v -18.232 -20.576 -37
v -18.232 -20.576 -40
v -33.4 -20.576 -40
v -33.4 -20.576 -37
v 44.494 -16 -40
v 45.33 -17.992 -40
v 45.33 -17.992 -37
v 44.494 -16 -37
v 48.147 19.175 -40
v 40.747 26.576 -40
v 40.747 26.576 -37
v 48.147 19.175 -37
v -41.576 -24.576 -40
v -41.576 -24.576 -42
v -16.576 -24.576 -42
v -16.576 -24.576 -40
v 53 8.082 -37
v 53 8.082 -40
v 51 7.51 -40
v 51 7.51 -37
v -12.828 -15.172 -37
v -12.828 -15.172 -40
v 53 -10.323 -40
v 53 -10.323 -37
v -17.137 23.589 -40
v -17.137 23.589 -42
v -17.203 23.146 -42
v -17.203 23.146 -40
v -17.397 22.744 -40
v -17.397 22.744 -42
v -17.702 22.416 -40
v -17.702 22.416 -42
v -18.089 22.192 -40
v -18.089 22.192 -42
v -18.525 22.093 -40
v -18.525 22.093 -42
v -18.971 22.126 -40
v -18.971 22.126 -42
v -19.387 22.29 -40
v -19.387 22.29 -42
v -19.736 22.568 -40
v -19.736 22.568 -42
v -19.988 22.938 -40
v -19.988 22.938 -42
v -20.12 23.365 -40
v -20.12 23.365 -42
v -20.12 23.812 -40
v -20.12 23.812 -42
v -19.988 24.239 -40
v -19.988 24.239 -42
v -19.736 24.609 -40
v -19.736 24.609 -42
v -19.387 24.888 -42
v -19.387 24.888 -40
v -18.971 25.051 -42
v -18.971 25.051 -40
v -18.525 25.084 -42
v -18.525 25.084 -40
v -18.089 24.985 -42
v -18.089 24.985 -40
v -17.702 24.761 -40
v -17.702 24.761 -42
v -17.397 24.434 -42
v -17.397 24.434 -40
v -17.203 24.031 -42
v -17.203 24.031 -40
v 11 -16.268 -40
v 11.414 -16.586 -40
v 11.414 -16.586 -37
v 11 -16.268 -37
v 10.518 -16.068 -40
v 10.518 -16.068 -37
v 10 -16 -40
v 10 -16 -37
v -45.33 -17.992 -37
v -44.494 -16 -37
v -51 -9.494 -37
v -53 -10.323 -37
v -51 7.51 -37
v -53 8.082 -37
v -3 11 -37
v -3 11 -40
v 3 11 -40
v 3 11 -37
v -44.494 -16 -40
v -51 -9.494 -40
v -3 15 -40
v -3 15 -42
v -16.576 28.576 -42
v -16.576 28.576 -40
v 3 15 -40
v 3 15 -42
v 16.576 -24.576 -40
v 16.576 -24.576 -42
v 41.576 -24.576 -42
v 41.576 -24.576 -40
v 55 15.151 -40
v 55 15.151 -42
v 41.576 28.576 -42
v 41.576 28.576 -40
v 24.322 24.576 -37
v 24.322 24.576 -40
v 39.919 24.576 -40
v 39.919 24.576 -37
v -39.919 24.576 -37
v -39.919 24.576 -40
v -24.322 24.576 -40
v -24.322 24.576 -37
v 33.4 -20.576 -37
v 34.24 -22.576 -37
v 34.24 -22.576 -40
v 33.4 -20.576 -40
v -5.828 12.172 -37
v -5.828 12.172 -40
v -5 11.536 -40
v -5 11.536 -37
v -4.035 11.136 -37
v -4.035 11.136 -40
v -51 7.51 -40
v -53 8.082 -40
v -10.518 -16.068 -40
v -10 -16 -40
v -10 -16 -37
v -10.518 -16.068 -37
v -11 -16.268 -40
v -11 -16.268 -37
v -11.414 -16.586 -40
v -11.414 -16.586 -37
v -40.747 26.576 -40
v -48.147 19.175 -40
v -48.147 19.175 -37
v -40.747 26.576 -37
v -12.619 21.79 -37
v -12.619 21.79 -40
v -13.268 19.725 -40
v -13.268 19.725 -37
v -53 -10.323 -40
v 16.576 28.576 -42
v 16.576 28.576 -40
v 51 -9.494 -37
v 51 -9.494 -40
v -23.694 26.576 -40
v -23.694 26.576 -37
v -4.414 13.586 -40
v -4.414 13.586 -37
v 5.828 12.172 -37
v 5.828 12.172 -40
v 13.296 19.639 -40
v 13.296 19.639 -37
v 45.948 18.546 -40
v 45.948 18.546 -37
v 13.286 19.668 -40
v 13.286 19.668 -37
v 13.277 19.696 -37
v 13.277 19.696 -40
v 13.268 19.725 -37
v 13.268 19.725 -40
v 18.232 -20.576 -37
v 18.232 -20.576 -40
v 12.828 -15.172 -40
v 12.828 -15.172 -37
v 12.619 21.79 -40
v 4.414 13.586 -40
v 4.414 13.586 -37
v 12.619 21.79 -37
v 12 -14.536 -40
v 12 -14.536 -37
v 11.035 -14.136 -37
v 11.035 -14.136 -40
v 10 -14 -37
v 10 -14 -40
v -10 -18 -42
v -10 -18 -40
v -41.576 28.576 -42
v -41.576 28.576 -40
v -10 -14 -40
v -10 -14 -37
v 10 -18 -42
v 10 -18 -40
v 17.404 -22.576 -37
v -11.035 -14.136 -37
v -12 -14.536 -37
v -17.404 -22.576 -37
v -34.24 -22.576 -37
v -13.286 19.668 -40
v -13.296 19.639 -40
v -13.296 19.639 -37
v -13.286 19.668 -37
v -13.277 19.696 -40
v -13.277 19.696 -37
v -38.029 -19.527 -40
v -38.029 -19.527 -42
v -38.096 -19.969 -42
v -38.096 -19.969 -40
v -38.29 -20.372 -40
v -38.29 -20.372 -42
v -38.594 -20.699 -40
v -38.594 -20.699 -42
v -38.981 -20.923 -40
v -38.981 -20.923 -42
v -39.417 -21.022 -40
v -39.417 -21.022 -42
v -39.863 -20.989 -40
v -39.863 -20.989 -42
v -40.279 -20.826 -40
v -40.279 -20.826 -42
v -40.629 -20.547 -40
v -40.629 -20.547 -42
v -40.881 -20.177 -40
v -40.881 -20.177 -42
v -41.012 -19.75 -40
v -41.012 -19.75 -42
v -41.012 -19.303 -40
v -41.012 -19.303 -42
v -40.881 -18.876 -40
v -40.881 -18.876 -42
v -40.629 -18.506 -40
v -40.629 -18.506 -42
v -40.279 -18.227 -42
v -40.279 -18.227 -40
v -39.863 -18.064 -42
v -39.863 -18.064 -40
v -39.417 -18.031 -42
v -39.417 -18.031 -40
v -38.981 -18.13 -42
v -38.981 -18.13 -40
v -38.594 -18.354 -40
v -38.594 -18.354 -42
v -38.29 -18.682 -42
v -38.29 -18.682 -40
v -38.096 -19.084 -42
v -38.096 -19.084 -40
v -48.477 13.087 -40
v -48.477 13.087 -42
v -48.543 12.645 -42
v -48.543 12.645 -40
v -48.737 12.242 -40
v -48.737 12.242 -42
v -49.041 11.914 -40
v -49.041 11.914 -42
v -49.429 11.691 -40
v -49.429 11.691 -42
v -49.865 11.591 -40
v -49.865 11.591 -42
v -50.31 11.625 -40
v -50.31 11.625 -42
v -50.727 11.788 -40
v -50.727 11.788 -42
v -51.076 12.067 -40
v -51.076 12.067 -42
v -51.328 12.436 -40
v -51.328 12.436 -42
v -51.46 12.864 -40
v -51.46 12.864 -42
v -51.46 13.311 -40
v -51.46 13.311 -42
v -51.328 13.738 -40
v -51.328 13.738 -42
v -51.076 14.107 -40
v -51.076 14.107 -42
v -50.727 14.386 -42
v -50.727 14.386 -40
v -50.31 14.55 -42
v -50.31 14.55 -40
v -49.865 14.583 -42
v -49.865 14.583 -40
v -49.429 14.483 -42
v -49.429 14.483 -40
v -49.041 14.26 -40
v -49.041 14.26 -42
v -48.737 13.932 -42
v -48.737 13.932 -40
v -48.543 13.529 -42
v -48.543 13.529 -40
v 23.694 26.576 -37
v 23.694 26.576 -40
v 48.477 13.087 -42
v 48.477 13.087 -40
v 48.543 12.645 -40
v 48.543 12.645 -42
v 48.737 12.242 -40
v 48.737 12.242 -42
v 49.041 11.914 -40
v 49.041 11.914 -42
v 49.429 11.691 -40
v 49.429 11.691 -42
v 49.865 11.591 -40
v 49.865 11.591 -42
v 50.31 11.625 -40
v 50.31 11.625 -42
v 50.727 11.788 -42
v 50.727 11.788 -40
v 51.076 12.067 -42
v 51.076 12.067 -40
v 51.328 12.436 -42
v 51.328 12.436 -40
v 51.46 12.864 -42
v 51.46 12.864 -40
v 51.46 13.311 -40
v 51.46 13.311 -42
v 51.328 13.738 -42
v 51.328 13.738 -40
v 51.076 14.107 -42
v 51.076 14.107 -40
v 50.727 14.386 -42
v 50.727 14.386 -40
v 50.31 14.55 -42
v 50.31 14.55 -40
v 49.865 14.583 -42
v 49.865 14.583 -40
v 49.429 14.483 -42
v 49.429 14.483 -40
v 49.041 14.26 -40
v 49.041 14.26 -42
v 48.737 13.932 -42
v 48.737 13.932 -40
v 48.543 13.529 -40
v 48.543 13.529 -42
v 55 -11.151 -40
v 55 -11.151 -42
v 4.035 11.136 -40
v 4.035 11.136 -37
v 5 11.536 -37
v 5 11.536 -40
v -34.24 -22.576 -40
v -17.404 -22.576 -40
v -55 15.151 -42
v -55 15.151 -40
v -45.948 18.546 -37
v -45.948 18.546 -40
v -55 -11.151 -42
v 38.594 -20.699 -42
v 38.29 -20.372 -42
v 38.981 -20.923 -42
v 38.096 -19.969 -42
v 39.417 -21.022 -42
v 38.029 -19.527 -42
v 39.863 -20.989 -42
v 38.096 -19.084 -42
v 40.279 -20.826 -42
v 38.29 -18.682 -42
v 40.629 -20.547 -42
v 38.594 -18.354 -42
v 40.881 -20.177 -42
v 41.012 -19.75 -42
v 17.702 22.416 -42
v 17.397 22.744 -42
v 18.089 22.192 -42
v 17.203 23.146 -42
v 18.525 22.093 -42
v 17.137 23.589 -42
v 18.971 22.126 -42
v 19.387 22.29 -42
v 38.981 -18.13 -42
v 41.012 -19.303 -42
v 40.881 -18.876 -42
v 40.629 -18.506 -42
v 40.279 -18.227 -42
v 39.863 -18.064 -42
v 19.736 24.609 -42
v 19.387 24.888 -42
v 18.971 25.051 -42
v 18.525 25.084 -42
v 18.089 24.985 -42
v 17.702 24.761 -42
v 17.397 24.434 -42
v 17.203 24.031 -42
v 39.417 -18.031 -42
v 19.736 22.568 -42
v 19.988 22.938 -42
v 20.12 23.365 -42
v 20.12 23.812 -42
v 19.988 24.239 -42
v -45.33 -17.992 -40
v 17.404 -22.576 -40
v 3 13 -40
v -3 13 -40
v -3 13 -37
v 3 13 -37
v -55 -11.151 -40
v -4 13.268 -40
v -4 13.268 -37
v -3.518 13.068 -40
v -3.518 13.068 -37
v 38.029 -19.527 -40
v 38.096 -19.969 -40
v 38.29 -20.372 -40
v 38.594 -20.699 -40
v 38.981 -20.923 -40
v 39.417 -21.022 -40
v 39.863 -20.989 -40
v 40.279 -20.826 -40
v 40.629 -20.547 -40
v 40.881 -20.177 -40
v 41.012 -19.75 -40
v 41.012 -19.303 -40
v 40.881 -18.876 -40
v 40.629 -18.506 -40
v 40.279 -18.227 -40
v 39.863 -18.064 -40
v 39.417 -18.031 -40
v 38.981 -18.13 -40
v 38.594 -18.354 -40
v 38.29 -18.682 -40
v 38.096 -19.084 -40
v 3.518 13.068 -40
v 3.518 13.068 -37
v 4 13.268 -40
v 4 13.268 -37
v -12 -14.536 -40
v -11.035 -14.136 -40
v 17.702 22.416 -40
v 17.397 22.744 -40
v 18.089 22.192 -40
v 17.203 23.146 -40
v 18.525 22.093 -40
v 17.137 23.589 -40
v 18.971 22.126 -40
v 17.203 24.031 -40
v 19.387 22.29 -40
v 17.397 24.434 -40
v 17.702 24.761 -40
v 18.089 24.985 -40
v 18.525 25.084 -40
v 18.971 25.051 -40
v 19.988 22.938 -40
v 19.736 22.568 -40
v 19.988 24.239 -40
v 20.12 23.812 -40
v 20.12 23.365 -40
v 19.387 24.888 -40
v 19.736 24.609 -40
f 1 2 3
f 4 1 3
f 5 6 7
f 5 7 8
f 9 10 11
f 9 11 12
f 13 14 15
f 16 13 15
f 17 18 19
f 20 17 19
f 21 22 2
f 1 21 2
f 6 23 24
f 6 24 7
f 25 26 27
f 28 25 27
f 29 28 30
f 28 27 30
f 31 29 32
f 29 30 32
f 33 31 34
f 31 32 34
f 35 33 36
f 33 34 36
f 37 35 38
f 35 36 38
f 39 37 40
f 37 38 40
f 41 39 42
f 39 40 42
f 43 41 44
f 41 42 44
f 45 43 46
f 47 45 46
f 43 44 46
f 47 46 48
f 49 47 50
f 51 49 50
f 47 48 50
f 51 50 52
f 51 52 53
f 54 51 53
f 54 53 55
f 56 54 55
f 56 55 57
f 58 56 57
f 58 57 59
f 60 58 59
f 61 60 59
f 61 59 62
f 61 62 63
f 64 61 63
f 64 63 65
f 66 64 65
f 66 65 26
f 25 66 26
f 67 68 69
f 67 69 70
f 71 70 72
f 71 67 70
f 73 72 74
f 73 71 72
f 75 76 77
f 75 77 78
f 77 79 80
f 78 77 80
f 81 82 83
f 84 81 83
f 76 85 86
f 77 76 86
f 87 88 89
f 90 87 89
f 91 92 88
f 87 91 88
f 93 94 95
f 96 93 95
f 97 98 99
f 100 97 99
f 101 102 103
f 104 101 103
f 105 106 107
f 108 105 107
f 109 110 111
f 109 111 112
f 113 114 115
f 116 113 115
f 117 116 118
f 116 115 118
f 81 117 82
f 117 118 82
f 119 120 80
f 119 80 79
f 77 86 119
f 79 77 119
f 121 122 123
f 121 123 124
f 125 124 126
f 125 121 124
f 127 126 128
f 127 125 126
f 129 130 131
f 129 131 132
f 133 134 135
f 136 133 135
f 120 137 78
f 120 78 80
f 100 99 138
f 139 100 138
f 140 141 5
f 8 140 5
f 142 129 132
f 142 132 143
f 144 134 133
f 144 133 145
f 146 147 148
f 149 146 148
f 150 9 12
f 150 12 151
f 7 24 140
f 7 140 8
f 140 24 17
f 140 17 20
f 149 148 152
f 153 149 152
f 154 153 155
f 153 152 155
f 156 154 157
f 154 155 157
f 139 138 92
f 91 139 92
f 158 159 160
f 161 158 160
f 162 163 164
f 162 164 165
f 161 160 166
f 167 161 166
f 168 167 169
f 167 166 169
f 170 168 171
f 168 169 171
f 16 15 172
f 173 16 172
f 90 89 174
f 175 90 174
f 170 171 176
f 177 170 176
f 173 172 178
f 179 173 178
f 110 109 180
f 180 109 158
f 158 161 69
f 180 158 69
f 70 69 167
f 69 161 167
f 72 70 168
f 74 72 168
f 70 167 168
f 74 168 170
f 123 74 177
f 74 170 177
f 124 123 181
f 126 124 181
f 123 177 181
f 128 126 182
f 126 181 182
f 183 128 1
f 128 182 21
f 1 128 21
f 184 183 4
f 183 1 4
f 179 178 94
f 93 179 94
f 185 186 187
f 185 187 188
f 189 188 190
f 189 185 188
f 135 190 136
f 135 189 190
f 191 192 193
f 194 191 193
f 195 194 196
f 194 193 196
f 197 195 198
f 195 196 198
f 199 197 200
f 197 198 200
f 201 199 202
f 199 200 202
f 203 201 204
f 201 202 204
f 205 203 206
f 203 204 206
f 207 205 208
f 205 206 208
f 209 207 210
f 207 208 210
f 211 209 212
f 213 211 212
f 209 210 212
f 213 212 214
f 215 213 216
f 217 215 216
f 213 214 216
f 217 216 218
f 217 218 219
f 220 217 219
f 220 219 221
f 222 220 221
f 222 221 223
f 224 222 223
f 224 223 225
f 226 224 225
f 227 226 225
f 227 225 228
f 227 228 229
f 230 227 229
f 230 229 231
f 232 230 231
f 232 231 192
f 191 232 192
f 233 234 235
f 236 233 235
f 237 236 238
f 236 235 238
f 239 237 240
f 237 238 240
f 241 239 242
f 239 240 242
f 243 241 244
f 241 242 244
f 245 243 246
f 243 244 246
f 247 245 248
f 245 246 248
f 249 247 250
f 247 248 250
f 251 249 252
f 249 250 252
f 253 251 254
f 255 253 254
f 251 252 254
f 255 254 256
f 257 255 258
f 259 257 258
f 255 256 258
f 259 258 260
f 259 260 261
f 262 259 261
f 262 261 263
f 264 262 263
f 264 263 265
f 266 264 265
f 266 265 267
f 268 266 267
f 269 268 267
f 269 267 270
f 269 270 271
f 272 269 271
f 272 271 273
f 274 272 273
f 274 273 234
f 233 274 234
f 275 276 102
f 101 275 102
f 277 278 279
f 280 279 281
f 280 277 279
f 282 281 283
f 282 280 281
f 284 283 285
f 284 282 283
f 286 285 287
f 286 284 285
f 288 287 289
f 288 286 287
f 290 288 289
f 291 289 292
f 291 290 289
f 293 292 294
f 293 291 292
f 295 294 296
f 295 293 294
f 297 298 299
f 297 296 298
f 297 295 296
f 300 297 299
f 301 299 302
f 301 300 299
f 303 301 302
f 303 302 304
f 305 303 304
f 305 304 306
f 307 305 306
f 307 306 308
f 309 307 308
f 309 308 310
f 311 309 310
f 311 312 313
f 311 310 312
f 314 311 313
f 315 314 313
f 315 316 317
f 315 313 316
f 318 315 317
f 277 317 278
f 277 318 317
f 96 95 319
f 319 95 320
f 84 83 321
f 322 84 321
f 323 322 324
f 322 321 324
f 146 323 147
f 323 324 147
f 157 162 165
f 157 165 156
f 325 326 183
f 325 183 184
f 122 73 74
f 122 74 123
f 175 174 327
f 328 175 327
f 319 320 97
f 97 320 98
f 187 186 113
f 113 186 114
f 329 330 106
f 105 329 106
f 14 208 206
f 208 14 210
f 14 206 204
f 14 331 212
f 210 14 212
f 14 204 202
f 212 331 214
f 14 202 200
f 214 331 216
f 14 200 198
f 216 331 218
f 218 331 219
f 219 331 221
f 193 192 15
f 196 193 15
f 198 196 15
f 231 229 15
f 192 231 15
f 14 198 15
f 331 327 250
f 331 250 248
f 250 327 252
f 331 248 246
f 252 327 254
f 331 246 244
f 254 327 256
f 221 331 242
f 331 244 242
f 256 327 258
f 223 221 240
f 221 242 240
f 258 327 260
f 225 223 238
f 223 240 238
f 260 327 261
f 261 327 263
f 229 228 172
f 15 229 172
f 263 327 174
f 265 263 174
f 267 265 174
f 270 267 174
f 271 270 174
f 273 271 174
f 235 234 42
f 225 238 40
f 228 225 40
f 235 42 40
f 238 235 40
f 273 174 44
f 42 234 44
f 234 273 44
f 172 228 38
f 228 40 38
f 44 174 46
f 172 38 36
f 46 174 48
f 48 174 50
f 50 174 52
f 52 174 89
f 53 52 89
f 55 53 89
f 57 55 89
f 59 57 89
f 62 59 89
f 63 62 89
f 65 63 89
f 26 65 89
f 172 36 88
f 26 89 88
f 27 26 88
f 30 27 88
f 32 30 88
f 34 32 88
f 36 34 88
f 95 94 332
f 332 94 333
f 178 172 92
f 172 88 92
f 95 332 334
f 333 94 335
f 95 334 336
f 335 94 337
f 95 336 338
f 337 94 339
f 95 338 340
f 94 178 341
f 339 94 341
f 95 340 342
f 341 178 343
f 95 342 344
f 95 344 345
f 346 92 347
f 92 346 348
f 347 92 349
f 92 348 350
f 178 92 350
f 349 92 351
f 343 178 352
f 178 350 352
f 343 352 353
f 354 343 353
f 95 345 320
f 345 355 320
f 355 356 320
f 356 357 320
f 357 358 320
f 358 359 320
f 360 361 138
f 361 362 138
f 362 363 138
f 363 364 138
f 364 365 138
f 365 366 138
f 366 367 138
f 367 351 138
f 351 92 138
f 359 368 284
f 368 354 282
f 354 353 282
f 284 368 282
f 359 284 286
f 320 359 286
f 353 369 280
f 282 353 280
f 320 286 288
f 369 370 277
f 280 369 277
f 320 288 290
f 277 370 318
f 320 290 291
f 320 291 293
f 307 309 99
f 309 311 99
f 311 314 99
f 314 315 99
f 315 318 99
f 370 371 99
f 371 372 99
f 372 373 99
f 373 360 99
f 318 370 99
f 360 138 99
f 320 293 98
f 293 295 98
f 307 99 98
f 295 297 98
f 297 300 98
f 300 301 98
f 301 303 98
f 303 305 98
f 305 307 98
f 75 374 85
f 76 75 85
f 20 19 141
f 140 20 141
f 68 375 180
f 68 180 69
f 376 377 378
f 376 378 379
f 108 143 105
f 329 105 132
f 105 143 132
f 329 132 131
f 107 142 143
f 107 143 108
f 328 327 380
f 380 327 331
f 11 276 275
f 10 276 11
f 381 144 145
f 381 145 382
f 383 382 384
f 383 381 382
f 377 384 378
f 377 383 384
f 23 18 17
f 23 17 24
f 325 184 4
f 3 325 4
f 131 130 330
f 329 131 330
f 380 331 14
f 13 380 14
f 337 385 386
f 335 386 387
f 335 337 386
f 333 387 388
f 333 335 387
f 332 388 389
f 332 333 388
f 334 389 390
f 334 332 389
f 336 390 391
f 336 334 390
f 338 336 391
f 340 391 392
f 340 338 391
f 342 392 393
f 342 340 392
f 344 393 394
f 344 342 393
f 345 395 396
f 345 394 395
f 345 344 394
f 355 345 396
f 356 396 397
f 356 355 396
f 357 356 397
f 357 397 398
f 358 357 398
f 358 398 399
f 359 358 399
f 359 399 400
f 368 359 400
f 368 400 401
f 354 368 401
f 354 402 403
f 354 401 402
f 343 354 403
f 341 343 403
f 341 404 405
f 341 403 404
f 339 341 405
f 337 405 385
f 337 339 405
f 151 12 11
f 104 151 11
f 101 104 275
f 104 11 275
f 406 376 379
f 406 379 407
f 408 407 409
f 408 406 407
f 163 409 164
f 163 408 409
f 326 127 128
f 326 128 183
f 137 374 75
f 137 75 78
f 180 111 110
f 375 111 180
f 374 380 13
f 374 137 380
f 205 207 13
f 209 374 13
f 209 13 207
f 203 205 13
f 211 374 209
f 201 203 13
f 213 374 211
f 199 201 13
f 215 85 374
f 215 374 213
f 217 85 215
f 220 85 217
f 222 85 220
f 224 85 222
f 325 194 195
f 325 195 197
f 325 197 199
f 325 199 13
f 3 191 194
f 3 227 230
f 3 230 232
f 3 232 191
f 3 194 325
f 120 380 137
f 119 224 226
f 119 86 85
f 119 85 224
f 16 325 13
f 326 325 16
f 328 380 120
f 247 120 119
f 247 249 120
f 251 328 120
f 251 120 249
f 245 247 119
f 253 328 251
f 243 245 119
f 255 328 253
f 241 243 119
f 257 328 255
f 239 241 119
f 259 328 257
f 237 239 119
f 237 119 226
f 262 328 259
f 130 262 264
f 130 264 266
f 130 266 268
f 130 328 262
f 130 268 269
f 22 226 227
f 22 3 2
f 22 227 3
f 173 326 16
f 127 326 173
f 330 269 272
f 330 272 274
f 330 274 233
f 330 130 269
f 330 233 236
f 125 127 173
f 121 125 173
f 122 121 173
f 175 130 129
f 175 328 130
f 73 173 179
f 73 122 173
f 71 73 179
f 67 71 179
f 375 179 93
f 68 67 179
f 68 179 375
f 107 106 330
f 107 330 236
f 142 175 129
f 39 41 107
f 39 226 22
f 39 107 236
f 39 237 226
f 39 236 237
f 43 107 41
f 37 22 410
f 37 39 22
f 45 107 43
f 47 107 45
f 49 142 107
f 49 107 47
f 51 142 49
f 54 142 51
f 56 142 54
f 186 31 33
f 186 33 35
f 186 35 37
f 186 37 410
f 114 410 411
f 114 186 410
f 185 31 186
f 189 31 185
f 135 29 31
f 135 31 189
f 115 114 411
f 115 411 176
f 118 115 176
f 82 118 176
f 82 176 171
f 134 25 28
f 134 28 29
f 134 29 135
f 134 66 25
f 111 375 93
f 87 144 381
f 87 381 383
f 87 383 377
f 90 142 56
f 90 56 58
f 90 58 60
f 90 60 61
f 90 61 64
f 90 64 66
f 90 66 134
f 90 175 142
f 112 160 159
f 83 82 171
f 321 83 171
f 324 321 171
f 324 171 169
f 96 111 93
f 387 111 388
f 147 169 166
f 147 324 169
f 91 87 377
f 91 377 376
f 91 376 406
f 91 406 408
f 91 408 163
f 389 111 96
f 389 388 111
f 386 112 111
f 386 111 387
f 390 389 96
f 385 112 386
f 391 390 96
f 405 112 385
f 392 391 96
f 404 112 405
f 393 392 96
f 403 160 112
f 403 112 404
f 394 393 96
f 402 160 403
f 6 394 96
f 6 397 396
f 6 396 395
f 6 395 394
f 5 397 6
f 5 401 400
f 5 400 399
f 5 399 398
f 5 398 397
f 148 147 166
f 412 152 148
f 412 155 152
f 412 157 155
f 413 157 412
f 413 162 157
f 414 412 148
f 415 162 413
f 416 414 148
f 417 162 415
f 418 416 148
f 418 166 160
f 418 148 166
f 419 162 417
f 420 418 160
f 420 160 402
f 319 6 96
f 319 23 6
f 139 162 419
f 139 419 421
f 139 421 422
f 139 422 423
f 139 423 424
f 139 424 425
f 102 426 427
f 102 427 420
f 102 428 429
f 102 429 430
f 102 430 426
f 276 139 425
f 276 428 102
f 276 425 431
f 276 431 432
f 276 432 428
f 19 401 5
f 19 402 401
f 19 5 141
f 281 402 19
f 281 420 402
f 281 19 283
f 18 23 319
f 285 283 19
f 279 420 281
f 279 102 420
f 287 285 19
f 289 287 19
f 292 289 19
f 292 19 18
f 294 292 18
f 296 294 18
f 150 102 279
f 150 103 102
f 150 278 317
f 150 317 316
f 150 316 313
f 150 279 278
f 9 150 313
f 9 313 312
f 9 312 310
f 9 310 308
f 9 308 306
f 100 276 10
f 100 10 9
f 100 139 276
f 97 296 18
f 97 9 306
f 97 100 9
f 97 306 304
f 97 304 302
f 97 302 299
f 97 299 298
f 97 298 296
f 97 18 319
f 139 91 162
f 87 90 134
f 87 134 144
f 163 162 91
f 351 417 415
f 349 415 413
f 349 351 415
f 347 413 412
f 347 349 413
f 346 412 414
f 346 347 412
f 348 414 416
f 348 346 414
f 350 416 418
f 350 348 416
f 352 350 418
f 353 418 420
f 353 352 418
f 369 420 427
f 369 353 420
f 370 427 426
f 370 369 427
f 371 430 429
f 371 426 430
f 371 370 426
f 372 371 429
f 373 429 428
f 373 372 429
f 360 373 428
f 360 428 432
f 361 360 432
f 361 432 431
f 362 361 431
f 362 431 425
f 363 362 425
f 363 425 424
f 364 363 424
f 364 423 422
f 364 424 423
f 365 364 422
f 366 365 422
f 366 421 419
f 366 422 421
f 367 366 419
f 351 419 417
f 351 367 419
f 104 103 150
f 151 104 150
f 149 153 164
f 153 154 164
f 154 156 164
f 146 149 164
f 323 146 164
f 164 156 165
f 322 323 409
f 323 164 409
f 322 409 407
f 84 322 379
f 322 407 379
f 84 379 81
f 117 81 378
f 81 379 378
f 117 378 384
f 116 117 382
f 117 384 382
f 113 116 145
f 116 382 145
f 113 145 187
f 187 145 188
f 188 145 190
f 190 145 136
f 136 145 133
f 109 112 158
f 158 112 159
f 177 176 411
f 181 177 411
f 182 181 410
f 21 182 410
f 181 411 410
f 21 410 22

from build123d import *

# Parameters (mm, degrees)
PAD004_DEPTH    = 2
PAD005_DEPTH    = 3
POCKET006_DEPTH = 5
SKETCH015_R     = 1.5
POCKET007_DEPTH = 5


with BuildPart() as part:
    # Sketch011 → Pad004 (new body)
    with BuildSketch(Plane.XY):
        Polygon((-41.575623, -24.575623), (-16.575623, -24.575623), (-10, -18), (10, -18), (16.575623, -24.575623), (41.575623, -24.575623), (55, -11.151247), (55, 15.151247), (41.575623, 28.575623), (16.575623, 28.575623), (3, 15), (-3, 15), (-16.575623, 28.575623), (-41.575623, 28.575623), (-55, 15.151247), (-55, -11.151247), align=None)
    extrude(amount=PAD004_DEPTH)

    # Sketch012 (on Face18 of Pad004) → Pad005 (join)
    with BuildSketch(Plane.XY.offset(2)):
        with BuildLine():
            Line((-53, -10.32282), (-53, 14.32282))
            Line((-53, 14.32282), (-40.747196, 26.575623))
            Line((-40.747196, 26.575623), (-17.40405, 26.575623))
            Line((-17.40405, 26.575623), (-4.414214, 13.585786))
            ThreePointArc((-4.414214, 13.585786), (-3.765367, 13.152241), (-3, 13))
            Line((-3, 13), (3, 13))
            ThreePointArc((3, 13), (3.765367, 13.152241), (4.414214, 13.585786))
            Line((4.414214, 13.585786), (17.40405, 26.575623))
            Line((17.40405, 26.575623), (40.747196, 26.575623))
            Line((40.747196, 26.575623), (53, 14.32282))
            Line((53, 14.32282), (53, -10.32282))
            Line((53, -10.32282), (40.747196, -22.575623))
            Line((40.747196, -22.575623), (17.40405, -22.575623))
            Line((17.40405, -22.575623), (11.414214, -16.585786))
            ThreePointArc((11.414214, -16.585786), (10.765367, -16.152241), (10, -16))
            Line((10, -16), (-10, -16))
            ThreePointArc((-10, -16), (-10.765367, -16.152241), (-11.414214, -16.585786))
            Line((-11.414214, -16.585786), (-17.40405, -22.575623))
            Line((-17.40405, -22.575623), (-40.747196, -22.575623))
            Line((-40.747196, -22.575623), (-53, -10.32282))
        make_face()
        with BuildLine():
            Line((-51, 13.494393), (-39.918769, 24.575623))
            Line((-39.918769, 24.575623), (-18.232477, 24.575623))
            Line((-18.232477, 24.575623), (-5.828427, 12.171573))
            ThreePointArc((-5.828427, 12.171573), (-4.530734, 11.304482), (-3, 11))
            Line((-3, 11), (3, 11))
            ThreePointArc((3, 11), (4.530734, 11.304482), (5.828427, 12.171573))
            Line((5.828427, 12.171573), (18.232477, 24.575623))
            Line((18.232477, 24.575623), (39.918769, 24.575623))
            Line((39.918769, 24.575623), (51, 13.494393))
            Line((51, 13.494393), (51, -9.494393))
            Line((51, -9.494393), (39.918769, -20.575623))
            Line((39.918769, -20.575623), (18.232477, -20.575623))
            Line((18.232477, -20.575623), (12.828427, -15.171573))
            ThreePointArc((12.828427, -15.171573), (11.530734, -14.304482), (10, -14))
            Line((10, -14), (-10, -14))
            ThreePointArc((-10, -14), (-11.530734, -14.304482), (-12.828427, -15.171573))
            Line((-12.828427, -15.171573), (-18.232477, -20.575623))
            Line((-18.232477, -20.575623), (-39.918769, -20.575623))
            Line((-39.918769, -20.575623), (-51, -9.494393))
            Line((-51, -9.494393), (-51, 13.494393))
        make_face(mode=Mode.SUBTRACT)
    extrude(amount=PAD005_DEPTH)

    # Sketch014 (on Face60 of Pad005) → Pocket006 (cut)
    with BuildSketch(Plane.XY.offset(2)):
        with BuildLine():
            ThreePointArc((-11.680199, 24.776311), (-15.604738, 32.299474), (-23.127902, 28.374935))
            Line((-23.127902, 28.374935), (-24.71589, 23.323333))
            ThreePointArc((-24.71589, 23.323333), (-20.791351, 15.800169), (-13.268187, 19.724708))
            Line((-11.680199, 24.776311), (-13.268187, 19.724708))
        make_face()
        with BuildLine():
            ThreePointArc((-51.349969, 20.091476), (-58.768657, 15.972851), (-54.650031, 8.554163))
            Line((-54.650031, 8.554163), (-47.649779, 6.551855))
            ThreePointArc((-47.649779, 6.551855), (-40.231091, 10.67048), (-44.349717, 18.089168))
            Line((-51.349969, 20.091476), (-44.349717, 18.089168))
        make_face()
        with BuildLine():
            ThreePointArc((-46.279481, -20.253162), (-43.069657, -28.107908), (-35.214911, -24.898084))
            Line((-35.214911, -24.898084), (-33.002469, -19.627871))
            ThreePointArc((-33.002469, -19.627871), (-36.212293, -11.773126), (-44.067038, -14.98295))
            Line((-46.279481, -20.253162), (-44.067038, -14.98295))
        make_face()
    pocket006 = extrude(amount=POCKET006_DEPTH, mode=Mode.SUBTRACT)

    # Sketch015 (on Face4 of Pocket006) → Pocket007 (cut)
    with BuildSketch(Plane(origin=(0, 0, 0), x_dir=(1, 0, 0), z_dir=(0, 0, -1))):
        with Locations((-39.529121, 19.526524)):
            Circle(SKETCH015_R)
        with Locations((-49.976597, -13.087161)):
            Circle(SKETCH015_R)
        with Locations((-18.636831, -23.588573)):
            Circle(SKETCH015_R)
    pocket007 = extrude(amount=-POCKET007_DEPTH, mode=Mode.SUBTRACT)

    # Mirrored001: Pocket006, Pocket007 across Sketch014 V_Axis
    add(pocket006.mirror(Plane(origin=(0, 0, 2), x_dir=(0, 0, 1), z_dir=(1, 0, 0))), mode=Mode.SUBTRACT)
    add(pocket007.mirror(Plane(origin=(0, 0, 2), x_dir=(0, 0, 1), z_dir=(1, 0, 0))), mode=Mode.SUBTRACT)


with BuildPart() as part_1:
    # Body002 placement: moved
    add(part.part.moved(Location((0, 0, -42))))


solid = part_1.part
